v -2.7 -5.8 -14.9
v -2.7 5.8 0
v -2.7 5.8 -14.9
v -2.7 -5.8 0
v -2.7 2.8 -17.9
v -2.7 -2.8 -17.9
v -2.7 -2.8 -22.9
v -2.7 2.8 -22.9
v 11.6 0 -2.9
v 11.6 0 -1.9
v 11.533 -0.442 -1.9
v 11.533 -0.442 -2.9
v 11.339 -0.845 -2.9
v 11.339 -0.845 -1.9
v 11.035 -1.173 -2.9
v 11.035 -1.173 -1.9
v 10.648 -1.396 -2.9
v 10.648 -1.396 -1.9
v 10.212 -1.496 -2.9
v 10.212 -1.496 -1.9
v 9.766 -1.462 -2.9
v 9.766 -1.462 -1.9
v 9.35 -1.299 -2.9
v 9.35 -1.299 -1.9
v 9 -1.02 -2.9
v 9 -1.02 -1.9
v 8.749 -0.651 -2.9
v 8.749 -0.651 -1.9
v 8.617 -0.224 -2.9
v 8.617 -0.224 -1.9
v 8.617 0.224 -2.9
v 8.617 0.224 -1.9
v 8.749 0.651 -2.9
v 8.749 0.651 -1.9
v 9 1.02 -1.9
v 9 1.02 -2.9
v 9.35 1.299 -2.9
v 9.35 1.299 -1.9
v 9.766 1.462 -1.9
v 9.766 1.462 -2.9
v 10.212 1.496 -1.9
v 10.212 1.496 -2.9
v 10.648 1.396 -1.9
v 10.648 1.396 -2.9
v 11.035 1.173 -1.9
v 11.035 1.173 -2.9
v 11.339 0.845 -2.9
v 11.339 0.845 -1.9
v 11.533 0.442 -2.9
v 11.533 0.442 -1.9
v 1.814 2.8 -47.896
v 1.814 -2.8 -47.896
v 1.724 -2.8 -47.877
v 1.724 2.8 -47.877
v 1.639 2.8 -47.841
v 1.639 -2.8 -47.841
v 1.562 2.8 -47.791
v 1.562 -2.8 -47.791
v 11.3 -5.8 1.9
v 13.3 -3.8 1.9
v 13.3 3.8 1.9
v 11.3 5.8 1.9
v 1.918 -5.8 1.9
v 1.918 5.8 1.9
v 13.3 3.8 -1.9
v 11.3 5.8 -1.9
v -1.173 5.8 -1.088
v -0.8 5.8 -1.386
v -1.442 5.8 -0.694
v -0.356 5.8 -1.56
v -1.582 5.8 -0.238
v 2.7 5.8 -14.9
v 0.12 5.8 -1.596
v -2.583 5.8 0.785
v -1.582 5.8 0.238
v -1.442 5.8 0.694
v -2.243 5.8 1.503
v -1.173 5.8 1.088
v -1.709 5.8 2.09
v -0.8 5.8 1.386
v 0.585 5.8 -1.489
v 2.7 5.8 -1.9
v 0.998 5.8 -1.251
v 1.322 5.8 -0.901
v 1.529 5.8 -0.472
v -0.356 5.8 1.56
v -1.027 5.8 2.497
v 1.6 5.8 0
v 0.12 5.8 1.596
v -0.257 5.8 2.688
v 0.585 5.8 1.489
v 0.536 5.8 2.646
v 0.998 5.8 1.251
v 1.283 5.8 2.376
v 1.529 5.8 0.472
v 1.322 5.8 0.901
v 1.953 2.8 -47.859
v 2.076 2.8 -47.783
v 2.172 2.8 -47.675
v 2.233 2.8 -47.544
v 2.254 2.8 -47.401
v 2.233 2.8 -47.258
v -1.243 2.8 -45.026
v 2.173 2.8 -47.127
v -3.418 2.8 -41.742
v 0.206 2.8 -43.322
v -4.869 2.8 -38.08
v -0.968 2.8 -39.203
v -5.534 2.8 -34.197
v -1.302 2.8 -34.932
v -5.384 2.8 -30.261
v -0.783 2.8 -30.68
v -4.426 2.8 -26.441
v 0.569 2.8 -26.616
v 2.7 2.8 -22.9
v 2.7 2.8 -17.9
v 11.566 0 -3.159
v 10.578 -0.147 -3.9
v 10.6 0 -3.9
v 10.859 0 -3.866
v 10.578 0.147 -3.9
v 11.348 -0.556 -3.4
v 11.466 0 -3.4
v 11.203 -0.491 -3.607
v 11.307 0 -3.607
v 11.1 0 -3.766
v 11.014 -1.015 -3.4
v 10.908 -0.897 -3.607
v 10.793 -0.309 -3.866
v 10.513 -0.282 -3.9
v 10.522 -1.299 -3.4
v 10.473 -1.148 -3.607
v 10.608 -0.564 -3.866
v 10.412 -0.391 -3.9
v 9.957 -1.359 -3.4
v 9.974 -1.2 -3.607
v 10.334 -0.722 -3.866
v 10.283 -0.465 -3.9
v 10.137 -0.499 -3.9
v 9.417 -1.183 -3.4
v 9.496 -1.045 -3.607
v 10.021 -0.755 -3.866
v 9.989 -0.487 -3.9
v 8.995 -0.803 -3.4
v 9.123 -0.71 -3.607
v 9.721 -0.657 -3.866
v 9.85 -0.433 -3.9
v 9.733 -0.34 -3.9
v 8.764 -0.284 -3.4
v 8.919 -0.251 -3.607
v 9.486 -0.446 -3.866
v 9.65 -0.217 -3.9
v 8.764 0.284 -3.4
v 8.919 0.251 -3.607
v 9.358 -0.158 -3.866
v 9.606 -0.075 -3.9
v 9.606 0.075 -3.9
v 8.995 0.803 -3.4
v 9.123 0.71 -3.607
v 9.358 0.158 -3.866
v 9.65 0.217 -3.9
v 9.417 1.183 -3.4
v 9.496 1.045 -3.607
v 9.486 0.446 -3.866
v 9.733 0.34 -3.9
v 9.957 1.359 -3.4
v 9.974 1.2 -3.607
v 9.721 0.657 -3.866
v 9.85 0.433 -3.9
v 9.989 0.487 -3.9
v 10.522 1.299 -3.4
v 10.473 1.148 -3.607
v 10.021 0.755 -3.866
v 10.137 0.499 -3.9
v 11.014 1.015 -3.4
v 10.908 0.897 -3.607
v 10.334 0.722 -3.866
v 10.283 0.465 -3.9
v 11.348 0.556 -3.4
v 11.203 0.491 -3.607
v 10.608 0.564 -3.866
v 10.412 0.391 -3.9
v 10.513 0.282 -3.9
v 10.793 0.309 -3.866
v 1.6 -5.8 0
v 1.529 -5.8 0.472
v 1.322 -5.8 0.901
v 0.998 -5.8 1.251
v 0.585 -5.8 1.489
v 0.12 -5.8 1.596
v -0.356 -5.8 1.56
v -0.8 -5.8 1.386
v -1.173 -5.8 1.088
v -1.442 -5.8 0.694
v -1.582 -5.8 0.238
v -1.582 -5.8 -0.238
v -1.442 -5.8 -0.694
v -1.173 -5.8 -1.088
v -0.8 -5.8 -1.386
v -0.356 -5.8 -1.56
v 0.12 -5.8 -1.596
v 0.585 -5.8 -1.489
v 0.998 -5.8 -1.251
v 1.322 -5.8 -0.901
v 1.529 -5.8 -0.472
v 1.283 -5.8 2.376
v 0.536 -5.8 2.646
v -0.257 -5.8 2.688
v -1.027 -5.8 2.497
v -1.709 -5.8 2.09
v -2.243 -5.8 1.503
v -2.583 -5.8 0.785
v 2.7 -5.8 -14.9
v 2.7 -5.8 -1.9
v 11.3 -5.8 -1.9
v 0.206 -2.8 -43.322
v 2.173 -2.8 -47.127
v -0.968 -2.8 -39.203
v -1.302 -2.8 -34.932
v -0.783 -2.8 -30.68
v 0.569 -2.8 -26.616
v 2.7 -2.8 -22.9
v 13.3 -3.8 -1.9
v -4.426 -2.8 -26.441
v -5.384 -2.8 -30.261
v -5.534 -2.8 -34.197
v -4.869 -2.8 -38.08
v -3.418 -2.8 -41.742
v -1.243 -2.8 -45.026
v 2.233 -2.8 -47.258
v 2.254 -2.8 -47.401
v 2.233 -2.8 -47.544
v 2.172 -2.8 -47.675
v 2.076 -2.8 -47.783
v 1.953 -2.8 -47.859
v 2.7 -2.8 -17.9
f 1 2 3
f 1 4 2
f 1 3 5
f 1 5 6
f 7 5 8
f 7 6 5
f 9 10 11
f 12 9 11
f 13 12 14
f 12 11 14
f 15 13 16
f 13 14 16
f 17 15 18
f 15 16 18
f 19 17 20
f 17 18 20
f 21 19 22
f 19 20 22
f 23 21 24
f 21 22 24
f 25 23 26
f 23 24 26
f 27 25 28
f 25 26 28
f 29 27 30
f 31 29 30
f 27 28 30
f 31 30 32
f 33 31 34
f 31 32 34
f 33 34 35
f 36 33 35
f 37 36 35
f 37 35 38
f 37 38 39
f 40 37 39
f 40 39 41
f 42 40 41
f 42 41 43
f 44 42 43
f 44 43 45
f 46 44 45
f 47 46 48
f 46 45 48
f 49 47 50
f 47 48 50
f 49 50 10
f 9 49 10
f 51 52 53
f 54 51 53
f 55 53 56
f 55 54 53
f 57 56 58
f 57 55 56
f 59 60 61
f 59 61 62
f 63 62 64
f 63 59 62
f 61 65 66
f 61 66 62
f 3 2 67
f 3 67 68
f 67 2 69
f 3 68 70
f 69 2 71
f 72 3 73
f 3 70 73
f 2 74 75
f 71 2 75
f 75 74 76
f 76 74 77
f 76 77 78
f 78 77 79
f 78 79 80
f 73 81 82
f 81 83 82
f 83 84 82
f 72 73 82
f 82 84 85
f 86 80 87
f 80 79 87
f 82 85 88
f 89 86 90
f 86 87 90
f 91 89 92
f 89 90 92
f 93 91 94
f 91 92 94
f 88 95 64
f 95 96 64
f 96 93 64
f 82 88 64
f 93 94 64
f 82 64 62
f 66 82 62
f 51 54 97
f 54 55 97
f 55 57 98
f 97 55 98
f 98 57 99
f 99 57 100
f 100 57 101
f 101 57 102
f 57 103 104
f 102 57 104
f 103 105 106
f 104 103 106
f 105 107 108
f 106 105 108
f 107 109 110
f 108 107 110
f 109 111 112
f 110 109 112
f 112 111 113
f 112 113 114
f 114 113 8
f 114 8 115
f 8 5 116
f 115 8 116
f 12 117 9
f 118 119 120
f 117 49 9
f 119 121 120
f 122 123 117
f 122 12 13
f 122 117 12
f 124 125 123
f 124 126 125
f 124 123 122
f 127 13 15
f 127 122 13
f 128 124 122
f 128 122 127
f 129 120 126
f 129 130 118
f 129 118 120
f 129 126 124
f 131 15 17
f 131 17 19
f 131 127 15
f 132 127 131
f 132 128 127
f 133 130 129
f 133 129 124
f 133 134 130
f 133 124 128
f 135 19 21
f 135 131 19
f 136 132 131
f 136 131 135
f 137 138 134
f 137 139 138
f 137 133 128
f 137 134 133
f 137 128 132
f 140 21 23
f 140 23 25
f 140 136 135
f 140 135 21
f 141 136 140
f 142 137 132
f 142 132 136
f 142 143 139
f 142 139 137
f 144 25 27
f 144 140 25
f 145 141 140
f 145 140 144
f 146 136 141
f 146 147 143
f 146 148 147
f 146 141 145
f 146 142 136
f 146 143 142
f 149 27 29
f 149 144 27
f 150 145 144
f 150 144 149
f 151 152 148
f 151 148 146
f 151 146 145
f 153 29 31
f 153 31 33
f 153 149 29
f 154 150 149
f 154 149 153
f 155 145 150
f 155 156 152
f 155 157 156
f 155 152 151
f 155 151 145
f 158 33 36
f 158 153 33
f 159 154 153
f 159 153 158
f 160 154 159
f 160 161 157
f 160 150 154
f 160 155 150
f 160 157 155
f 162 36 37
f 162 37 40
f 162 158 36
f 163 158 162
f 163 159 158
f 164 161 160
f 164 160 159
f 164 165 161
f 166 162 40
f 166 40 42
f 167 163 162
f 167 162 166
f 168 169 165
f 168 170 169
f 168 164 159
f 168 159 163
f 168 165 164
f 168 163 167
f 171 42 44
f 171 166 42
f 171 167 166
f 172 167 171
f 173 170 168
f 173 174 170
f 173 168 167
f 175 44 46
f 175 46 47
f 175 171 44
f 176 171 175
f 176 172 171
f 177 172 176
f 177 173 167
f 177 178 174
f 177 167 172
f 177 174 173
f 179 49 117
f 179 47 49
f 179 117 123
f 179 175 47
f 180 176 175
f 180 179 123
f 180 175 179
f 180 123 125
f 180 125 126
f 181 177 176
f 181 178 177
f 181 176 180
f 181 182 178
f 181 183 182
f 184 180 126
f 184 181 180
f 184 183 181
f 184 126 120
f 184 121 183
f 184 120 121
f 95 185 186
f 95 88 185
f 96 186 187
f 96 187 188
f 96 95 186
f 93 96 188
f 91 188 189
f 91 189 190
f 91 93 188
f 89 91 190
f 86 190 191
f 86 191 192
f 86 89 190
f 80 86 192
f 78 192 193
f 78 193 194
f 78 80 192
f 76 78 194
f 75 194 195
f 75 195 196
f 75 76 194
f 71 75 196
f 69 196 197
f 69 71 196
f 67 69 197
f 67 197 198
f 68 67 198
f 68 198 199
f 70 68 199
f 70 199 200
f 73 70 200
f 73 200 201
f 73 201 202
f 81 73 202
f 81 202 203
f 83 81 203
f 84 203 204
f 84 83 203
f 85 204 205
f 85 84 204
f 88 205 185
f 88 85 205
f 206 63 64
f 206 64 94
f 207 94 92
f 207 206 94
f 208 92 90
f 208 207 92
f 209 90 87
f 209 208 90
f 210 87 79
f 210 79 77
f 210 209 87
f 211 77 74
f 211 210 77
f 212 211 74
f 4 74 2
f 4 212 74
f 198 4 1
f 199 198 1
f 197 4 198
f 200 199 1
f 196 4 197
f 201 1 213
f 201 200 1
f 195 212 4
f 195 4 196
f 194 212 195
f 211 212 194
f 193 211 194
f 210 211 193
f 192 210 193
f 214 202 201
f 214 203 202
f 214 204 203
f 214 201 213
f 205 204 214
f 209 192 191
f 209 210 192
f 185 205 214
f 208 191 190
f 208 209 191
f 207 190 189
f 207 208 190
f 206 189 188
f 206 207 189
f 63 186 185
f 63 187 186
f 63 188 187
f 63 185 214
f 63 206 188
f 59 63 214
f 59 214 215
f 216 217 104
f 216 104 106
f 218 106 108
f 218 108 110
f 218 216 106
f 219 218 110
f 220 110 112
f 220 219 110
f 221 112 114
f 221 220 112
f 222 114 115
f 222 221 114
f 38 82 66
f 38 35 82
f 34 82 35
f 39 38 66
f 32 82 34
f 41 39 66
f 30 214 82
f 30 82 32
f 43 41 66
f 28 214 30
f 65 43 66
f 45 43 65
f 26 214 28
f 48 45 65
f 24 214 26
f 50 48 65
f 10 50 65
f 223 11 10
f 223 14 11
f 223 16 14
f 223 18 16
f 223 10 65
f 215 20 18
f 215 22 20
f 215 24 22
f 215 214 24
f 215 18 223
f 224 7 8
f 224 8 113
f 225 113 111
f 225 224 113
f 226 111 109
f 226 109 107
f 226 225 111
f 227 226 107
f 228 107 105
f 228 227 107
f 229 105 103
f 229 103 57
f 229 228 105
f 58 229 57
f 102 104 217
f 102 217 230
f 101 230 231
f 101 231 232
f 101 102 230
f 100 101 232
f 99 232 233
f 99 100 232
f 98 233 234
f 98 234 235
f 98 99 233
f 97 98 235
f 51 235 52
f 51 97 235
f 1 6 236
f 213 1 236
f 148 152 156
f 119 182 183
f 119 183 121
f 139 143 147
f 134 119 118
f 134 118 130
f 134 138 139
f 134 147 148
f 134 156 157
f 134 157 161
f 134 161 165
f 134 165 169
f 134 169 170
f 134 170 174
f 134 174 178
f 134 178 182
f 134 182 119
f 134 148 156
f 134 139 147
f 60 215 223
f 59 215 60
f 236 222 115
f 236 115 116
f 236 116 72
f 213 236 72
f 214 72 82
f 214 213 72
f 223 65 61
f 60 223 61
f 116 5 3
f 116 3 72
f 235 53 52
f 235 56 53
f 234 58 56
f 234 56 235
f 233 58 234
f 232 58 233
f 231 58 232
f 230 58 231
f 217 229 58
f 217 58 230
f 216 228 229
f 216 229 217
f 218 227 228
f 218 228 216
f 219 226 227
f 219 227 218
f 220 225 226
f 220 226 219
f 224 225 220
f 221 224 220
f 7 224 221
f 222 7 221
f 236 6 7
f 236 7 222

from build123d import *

# Parameters (mm, degrees)
F0_R        = 1.6
F1_DEPTH    = 5.8
F0_W        = 5.4
F0_H        = 5
F2_DEPTH    = 2.8
F3_SIZE     = 2.99999
F4_R        = 1.5
F5_DEPTH    = 2
F6_R        = 1
F7_T1_DEPTH = 6.481505829
F7_T3_DEPTH = 10.3311661503
F8_SIZE     = 2


# Not quite as in the source:
# - a fillet or chamfer that OpenCascade refuses, or shapes differently, is made with other operations: its cross-section is extruded or revolved along the edge and cut away or added
# - a fillet or chamfer is up to 0.001 mm smaller than in the source, because OpenCascade refuses the exact size


with BuildPart() as f1:
    # F0 (on Front) → F1 (new body, symmetric)
    with BuildSketch(Plane.XZ):
        with BuildLine():
            ThreePointArc((1.9183326093, -1.9), (2.4969479415, -1.0272540958), (2.7, 0))
            ThreePointArc((2.7, 0), (2.4969479415, 1.0272540958), (1.9183326093, 1.9))
            ThreePointArc((1.9183326093, 1.9), (-1.0272540958, 2.4969479415), (-2.7, 0))
            ThreePointArc((-2.7, 0), (-1.0272540958, -2.4969479415), (1.9183326093, -1.9))
        make_face()
        Circle(F0_R, mode=Mode.SUBTRACT)
        with BuildLine():
            ThreePointArc((1.9183326093, 1.9), (2.4969479415, 1.0272540958), (2.7, 0))
            ThreePointArc((2.7, 0), (2.4969479415, -1.0272540958), (1.9183326093, -1.9))
            Line((1.9183326093, -1.9), (2.7, -1.9))
            Line((2.7, -1.9), (13.3, -1.9))
            Line((13.3, -1.9), (13.3, 1.9))
            Line((13.3, 1.9), (1.9183326093, 1.9))
        make_face()
        with BuildLine():
            Line((2.7, -1.9), (1.9183326093, -1.9))
            ThreePointArc((1.9183326093, -1.9), (-1.0272540958, -2.4969479415), (-2.7, 0))
            Line((-2.7, 0), (-2.7, -17.9))
            Line((-2.7, -17.9), (2.7, -17.9))
            Line((2.7, -17.9), (2.7, -1.9))
        make_face()
    extrude(amount=F1_DEPTH, both=True)

    # F0 (on Front) → F2 (join, symmetric)
    with BuildSketch(Plane.XZ):
        with BuildLine():
            Line((2.7, -22.9), (-2.7, -22.9))
            ThreePointArc((-2.7, -22.9), (-5.2874639524, -36.2425936556), (1.7, -47.9))
            Line((1.7, -47.9), (2.7, -47.9))
            ThreePointArc((2.7, -47.9), (-1.3071443155, -35.4), (2.7, -22.9))
        make_face()
        with Locations((0, -20.4)):
            Rectangle(F0_W, F0_H)
    extrude(amount=F2_DEPTH, both=True)

    # F3 (size 3 in the source; OpenCascade refuses exactly that, so slightly less here)
    f3_edges = [f1.edges().sort_by_distance(p)[0] for p in [
        (0, -5.8, -17.9),
        (0, 5.8, -17.9),
    ]]
    chamfer(f3_edges, length=F3_SIZE)

    # F4 (on face) → F5 (join)
    with BuildSketch(Plane(origin=(0, 0, -1.9), x_dir=(1, 0, 0), z_dir=(0, 0, -1))):
        with Locations((10.1, 0)):
            Circle(F4_R)
    extrude(amount=F5_DEPTH)

    # F6
    f6_edges = [f1.edges().sort_by_distance(p)[0] for p in [
        (8.6, 0, -3.9),
    ]]
    fillet(f6_edges, radius=F6_R)

    # F7: fillet of radius 0.5 on 2 edges, made by hand

    # F7_s2 → F7_t1 (cut)
    with BuildSketch(Plane.XZ.offset(-3.2407529145)):
        with BuildLine():
            ThreePointArc((1.8739659479, -47.9), (1.7085587408, -47.871847916), (1.561777764, -47.7905618233))
            ThreePointArc((1.561777764, -47.7905618233), (1.6307619466, -47.8454412332), (1.7, -47.9))
            Line((1.7, -47.9), (1.8739659479, -47.9))
        make_face()
    extrude(amount=F7_T1_DEPTH, mode=Mode.SUBTRACT)

    # F7_s4 → F7_t3 (cut)
    with BuildSketch(Plane.XZ.offset(-5.1655830752)):
        with BuildLine():
            ThreePointArc((2.1728369726, -47.1272727273), (2.1932913064, -47.6383656473), (1.7537667699, -47.9))
            Line((1.7537667699, -47.9), (2.7, -47.9))
            ThreePointArc((2.7, -47.9), (2.4322155262, -47.5165036692), (2.1728369726, -47.1272727273))
        make_face()
    extrude(amount=F7_T3_DEPTH, mode=Mode.SUBTRACT)

    # F8
    f8_edges = [f1.edges().sort_by_distance(p)[0] for p in [
        (13.3, -5.8, 0),
        (13.3, 5.8, 0),
    ]]
    chamfer(f8_edges, length=F8_SIZE)


solid = f1.part
